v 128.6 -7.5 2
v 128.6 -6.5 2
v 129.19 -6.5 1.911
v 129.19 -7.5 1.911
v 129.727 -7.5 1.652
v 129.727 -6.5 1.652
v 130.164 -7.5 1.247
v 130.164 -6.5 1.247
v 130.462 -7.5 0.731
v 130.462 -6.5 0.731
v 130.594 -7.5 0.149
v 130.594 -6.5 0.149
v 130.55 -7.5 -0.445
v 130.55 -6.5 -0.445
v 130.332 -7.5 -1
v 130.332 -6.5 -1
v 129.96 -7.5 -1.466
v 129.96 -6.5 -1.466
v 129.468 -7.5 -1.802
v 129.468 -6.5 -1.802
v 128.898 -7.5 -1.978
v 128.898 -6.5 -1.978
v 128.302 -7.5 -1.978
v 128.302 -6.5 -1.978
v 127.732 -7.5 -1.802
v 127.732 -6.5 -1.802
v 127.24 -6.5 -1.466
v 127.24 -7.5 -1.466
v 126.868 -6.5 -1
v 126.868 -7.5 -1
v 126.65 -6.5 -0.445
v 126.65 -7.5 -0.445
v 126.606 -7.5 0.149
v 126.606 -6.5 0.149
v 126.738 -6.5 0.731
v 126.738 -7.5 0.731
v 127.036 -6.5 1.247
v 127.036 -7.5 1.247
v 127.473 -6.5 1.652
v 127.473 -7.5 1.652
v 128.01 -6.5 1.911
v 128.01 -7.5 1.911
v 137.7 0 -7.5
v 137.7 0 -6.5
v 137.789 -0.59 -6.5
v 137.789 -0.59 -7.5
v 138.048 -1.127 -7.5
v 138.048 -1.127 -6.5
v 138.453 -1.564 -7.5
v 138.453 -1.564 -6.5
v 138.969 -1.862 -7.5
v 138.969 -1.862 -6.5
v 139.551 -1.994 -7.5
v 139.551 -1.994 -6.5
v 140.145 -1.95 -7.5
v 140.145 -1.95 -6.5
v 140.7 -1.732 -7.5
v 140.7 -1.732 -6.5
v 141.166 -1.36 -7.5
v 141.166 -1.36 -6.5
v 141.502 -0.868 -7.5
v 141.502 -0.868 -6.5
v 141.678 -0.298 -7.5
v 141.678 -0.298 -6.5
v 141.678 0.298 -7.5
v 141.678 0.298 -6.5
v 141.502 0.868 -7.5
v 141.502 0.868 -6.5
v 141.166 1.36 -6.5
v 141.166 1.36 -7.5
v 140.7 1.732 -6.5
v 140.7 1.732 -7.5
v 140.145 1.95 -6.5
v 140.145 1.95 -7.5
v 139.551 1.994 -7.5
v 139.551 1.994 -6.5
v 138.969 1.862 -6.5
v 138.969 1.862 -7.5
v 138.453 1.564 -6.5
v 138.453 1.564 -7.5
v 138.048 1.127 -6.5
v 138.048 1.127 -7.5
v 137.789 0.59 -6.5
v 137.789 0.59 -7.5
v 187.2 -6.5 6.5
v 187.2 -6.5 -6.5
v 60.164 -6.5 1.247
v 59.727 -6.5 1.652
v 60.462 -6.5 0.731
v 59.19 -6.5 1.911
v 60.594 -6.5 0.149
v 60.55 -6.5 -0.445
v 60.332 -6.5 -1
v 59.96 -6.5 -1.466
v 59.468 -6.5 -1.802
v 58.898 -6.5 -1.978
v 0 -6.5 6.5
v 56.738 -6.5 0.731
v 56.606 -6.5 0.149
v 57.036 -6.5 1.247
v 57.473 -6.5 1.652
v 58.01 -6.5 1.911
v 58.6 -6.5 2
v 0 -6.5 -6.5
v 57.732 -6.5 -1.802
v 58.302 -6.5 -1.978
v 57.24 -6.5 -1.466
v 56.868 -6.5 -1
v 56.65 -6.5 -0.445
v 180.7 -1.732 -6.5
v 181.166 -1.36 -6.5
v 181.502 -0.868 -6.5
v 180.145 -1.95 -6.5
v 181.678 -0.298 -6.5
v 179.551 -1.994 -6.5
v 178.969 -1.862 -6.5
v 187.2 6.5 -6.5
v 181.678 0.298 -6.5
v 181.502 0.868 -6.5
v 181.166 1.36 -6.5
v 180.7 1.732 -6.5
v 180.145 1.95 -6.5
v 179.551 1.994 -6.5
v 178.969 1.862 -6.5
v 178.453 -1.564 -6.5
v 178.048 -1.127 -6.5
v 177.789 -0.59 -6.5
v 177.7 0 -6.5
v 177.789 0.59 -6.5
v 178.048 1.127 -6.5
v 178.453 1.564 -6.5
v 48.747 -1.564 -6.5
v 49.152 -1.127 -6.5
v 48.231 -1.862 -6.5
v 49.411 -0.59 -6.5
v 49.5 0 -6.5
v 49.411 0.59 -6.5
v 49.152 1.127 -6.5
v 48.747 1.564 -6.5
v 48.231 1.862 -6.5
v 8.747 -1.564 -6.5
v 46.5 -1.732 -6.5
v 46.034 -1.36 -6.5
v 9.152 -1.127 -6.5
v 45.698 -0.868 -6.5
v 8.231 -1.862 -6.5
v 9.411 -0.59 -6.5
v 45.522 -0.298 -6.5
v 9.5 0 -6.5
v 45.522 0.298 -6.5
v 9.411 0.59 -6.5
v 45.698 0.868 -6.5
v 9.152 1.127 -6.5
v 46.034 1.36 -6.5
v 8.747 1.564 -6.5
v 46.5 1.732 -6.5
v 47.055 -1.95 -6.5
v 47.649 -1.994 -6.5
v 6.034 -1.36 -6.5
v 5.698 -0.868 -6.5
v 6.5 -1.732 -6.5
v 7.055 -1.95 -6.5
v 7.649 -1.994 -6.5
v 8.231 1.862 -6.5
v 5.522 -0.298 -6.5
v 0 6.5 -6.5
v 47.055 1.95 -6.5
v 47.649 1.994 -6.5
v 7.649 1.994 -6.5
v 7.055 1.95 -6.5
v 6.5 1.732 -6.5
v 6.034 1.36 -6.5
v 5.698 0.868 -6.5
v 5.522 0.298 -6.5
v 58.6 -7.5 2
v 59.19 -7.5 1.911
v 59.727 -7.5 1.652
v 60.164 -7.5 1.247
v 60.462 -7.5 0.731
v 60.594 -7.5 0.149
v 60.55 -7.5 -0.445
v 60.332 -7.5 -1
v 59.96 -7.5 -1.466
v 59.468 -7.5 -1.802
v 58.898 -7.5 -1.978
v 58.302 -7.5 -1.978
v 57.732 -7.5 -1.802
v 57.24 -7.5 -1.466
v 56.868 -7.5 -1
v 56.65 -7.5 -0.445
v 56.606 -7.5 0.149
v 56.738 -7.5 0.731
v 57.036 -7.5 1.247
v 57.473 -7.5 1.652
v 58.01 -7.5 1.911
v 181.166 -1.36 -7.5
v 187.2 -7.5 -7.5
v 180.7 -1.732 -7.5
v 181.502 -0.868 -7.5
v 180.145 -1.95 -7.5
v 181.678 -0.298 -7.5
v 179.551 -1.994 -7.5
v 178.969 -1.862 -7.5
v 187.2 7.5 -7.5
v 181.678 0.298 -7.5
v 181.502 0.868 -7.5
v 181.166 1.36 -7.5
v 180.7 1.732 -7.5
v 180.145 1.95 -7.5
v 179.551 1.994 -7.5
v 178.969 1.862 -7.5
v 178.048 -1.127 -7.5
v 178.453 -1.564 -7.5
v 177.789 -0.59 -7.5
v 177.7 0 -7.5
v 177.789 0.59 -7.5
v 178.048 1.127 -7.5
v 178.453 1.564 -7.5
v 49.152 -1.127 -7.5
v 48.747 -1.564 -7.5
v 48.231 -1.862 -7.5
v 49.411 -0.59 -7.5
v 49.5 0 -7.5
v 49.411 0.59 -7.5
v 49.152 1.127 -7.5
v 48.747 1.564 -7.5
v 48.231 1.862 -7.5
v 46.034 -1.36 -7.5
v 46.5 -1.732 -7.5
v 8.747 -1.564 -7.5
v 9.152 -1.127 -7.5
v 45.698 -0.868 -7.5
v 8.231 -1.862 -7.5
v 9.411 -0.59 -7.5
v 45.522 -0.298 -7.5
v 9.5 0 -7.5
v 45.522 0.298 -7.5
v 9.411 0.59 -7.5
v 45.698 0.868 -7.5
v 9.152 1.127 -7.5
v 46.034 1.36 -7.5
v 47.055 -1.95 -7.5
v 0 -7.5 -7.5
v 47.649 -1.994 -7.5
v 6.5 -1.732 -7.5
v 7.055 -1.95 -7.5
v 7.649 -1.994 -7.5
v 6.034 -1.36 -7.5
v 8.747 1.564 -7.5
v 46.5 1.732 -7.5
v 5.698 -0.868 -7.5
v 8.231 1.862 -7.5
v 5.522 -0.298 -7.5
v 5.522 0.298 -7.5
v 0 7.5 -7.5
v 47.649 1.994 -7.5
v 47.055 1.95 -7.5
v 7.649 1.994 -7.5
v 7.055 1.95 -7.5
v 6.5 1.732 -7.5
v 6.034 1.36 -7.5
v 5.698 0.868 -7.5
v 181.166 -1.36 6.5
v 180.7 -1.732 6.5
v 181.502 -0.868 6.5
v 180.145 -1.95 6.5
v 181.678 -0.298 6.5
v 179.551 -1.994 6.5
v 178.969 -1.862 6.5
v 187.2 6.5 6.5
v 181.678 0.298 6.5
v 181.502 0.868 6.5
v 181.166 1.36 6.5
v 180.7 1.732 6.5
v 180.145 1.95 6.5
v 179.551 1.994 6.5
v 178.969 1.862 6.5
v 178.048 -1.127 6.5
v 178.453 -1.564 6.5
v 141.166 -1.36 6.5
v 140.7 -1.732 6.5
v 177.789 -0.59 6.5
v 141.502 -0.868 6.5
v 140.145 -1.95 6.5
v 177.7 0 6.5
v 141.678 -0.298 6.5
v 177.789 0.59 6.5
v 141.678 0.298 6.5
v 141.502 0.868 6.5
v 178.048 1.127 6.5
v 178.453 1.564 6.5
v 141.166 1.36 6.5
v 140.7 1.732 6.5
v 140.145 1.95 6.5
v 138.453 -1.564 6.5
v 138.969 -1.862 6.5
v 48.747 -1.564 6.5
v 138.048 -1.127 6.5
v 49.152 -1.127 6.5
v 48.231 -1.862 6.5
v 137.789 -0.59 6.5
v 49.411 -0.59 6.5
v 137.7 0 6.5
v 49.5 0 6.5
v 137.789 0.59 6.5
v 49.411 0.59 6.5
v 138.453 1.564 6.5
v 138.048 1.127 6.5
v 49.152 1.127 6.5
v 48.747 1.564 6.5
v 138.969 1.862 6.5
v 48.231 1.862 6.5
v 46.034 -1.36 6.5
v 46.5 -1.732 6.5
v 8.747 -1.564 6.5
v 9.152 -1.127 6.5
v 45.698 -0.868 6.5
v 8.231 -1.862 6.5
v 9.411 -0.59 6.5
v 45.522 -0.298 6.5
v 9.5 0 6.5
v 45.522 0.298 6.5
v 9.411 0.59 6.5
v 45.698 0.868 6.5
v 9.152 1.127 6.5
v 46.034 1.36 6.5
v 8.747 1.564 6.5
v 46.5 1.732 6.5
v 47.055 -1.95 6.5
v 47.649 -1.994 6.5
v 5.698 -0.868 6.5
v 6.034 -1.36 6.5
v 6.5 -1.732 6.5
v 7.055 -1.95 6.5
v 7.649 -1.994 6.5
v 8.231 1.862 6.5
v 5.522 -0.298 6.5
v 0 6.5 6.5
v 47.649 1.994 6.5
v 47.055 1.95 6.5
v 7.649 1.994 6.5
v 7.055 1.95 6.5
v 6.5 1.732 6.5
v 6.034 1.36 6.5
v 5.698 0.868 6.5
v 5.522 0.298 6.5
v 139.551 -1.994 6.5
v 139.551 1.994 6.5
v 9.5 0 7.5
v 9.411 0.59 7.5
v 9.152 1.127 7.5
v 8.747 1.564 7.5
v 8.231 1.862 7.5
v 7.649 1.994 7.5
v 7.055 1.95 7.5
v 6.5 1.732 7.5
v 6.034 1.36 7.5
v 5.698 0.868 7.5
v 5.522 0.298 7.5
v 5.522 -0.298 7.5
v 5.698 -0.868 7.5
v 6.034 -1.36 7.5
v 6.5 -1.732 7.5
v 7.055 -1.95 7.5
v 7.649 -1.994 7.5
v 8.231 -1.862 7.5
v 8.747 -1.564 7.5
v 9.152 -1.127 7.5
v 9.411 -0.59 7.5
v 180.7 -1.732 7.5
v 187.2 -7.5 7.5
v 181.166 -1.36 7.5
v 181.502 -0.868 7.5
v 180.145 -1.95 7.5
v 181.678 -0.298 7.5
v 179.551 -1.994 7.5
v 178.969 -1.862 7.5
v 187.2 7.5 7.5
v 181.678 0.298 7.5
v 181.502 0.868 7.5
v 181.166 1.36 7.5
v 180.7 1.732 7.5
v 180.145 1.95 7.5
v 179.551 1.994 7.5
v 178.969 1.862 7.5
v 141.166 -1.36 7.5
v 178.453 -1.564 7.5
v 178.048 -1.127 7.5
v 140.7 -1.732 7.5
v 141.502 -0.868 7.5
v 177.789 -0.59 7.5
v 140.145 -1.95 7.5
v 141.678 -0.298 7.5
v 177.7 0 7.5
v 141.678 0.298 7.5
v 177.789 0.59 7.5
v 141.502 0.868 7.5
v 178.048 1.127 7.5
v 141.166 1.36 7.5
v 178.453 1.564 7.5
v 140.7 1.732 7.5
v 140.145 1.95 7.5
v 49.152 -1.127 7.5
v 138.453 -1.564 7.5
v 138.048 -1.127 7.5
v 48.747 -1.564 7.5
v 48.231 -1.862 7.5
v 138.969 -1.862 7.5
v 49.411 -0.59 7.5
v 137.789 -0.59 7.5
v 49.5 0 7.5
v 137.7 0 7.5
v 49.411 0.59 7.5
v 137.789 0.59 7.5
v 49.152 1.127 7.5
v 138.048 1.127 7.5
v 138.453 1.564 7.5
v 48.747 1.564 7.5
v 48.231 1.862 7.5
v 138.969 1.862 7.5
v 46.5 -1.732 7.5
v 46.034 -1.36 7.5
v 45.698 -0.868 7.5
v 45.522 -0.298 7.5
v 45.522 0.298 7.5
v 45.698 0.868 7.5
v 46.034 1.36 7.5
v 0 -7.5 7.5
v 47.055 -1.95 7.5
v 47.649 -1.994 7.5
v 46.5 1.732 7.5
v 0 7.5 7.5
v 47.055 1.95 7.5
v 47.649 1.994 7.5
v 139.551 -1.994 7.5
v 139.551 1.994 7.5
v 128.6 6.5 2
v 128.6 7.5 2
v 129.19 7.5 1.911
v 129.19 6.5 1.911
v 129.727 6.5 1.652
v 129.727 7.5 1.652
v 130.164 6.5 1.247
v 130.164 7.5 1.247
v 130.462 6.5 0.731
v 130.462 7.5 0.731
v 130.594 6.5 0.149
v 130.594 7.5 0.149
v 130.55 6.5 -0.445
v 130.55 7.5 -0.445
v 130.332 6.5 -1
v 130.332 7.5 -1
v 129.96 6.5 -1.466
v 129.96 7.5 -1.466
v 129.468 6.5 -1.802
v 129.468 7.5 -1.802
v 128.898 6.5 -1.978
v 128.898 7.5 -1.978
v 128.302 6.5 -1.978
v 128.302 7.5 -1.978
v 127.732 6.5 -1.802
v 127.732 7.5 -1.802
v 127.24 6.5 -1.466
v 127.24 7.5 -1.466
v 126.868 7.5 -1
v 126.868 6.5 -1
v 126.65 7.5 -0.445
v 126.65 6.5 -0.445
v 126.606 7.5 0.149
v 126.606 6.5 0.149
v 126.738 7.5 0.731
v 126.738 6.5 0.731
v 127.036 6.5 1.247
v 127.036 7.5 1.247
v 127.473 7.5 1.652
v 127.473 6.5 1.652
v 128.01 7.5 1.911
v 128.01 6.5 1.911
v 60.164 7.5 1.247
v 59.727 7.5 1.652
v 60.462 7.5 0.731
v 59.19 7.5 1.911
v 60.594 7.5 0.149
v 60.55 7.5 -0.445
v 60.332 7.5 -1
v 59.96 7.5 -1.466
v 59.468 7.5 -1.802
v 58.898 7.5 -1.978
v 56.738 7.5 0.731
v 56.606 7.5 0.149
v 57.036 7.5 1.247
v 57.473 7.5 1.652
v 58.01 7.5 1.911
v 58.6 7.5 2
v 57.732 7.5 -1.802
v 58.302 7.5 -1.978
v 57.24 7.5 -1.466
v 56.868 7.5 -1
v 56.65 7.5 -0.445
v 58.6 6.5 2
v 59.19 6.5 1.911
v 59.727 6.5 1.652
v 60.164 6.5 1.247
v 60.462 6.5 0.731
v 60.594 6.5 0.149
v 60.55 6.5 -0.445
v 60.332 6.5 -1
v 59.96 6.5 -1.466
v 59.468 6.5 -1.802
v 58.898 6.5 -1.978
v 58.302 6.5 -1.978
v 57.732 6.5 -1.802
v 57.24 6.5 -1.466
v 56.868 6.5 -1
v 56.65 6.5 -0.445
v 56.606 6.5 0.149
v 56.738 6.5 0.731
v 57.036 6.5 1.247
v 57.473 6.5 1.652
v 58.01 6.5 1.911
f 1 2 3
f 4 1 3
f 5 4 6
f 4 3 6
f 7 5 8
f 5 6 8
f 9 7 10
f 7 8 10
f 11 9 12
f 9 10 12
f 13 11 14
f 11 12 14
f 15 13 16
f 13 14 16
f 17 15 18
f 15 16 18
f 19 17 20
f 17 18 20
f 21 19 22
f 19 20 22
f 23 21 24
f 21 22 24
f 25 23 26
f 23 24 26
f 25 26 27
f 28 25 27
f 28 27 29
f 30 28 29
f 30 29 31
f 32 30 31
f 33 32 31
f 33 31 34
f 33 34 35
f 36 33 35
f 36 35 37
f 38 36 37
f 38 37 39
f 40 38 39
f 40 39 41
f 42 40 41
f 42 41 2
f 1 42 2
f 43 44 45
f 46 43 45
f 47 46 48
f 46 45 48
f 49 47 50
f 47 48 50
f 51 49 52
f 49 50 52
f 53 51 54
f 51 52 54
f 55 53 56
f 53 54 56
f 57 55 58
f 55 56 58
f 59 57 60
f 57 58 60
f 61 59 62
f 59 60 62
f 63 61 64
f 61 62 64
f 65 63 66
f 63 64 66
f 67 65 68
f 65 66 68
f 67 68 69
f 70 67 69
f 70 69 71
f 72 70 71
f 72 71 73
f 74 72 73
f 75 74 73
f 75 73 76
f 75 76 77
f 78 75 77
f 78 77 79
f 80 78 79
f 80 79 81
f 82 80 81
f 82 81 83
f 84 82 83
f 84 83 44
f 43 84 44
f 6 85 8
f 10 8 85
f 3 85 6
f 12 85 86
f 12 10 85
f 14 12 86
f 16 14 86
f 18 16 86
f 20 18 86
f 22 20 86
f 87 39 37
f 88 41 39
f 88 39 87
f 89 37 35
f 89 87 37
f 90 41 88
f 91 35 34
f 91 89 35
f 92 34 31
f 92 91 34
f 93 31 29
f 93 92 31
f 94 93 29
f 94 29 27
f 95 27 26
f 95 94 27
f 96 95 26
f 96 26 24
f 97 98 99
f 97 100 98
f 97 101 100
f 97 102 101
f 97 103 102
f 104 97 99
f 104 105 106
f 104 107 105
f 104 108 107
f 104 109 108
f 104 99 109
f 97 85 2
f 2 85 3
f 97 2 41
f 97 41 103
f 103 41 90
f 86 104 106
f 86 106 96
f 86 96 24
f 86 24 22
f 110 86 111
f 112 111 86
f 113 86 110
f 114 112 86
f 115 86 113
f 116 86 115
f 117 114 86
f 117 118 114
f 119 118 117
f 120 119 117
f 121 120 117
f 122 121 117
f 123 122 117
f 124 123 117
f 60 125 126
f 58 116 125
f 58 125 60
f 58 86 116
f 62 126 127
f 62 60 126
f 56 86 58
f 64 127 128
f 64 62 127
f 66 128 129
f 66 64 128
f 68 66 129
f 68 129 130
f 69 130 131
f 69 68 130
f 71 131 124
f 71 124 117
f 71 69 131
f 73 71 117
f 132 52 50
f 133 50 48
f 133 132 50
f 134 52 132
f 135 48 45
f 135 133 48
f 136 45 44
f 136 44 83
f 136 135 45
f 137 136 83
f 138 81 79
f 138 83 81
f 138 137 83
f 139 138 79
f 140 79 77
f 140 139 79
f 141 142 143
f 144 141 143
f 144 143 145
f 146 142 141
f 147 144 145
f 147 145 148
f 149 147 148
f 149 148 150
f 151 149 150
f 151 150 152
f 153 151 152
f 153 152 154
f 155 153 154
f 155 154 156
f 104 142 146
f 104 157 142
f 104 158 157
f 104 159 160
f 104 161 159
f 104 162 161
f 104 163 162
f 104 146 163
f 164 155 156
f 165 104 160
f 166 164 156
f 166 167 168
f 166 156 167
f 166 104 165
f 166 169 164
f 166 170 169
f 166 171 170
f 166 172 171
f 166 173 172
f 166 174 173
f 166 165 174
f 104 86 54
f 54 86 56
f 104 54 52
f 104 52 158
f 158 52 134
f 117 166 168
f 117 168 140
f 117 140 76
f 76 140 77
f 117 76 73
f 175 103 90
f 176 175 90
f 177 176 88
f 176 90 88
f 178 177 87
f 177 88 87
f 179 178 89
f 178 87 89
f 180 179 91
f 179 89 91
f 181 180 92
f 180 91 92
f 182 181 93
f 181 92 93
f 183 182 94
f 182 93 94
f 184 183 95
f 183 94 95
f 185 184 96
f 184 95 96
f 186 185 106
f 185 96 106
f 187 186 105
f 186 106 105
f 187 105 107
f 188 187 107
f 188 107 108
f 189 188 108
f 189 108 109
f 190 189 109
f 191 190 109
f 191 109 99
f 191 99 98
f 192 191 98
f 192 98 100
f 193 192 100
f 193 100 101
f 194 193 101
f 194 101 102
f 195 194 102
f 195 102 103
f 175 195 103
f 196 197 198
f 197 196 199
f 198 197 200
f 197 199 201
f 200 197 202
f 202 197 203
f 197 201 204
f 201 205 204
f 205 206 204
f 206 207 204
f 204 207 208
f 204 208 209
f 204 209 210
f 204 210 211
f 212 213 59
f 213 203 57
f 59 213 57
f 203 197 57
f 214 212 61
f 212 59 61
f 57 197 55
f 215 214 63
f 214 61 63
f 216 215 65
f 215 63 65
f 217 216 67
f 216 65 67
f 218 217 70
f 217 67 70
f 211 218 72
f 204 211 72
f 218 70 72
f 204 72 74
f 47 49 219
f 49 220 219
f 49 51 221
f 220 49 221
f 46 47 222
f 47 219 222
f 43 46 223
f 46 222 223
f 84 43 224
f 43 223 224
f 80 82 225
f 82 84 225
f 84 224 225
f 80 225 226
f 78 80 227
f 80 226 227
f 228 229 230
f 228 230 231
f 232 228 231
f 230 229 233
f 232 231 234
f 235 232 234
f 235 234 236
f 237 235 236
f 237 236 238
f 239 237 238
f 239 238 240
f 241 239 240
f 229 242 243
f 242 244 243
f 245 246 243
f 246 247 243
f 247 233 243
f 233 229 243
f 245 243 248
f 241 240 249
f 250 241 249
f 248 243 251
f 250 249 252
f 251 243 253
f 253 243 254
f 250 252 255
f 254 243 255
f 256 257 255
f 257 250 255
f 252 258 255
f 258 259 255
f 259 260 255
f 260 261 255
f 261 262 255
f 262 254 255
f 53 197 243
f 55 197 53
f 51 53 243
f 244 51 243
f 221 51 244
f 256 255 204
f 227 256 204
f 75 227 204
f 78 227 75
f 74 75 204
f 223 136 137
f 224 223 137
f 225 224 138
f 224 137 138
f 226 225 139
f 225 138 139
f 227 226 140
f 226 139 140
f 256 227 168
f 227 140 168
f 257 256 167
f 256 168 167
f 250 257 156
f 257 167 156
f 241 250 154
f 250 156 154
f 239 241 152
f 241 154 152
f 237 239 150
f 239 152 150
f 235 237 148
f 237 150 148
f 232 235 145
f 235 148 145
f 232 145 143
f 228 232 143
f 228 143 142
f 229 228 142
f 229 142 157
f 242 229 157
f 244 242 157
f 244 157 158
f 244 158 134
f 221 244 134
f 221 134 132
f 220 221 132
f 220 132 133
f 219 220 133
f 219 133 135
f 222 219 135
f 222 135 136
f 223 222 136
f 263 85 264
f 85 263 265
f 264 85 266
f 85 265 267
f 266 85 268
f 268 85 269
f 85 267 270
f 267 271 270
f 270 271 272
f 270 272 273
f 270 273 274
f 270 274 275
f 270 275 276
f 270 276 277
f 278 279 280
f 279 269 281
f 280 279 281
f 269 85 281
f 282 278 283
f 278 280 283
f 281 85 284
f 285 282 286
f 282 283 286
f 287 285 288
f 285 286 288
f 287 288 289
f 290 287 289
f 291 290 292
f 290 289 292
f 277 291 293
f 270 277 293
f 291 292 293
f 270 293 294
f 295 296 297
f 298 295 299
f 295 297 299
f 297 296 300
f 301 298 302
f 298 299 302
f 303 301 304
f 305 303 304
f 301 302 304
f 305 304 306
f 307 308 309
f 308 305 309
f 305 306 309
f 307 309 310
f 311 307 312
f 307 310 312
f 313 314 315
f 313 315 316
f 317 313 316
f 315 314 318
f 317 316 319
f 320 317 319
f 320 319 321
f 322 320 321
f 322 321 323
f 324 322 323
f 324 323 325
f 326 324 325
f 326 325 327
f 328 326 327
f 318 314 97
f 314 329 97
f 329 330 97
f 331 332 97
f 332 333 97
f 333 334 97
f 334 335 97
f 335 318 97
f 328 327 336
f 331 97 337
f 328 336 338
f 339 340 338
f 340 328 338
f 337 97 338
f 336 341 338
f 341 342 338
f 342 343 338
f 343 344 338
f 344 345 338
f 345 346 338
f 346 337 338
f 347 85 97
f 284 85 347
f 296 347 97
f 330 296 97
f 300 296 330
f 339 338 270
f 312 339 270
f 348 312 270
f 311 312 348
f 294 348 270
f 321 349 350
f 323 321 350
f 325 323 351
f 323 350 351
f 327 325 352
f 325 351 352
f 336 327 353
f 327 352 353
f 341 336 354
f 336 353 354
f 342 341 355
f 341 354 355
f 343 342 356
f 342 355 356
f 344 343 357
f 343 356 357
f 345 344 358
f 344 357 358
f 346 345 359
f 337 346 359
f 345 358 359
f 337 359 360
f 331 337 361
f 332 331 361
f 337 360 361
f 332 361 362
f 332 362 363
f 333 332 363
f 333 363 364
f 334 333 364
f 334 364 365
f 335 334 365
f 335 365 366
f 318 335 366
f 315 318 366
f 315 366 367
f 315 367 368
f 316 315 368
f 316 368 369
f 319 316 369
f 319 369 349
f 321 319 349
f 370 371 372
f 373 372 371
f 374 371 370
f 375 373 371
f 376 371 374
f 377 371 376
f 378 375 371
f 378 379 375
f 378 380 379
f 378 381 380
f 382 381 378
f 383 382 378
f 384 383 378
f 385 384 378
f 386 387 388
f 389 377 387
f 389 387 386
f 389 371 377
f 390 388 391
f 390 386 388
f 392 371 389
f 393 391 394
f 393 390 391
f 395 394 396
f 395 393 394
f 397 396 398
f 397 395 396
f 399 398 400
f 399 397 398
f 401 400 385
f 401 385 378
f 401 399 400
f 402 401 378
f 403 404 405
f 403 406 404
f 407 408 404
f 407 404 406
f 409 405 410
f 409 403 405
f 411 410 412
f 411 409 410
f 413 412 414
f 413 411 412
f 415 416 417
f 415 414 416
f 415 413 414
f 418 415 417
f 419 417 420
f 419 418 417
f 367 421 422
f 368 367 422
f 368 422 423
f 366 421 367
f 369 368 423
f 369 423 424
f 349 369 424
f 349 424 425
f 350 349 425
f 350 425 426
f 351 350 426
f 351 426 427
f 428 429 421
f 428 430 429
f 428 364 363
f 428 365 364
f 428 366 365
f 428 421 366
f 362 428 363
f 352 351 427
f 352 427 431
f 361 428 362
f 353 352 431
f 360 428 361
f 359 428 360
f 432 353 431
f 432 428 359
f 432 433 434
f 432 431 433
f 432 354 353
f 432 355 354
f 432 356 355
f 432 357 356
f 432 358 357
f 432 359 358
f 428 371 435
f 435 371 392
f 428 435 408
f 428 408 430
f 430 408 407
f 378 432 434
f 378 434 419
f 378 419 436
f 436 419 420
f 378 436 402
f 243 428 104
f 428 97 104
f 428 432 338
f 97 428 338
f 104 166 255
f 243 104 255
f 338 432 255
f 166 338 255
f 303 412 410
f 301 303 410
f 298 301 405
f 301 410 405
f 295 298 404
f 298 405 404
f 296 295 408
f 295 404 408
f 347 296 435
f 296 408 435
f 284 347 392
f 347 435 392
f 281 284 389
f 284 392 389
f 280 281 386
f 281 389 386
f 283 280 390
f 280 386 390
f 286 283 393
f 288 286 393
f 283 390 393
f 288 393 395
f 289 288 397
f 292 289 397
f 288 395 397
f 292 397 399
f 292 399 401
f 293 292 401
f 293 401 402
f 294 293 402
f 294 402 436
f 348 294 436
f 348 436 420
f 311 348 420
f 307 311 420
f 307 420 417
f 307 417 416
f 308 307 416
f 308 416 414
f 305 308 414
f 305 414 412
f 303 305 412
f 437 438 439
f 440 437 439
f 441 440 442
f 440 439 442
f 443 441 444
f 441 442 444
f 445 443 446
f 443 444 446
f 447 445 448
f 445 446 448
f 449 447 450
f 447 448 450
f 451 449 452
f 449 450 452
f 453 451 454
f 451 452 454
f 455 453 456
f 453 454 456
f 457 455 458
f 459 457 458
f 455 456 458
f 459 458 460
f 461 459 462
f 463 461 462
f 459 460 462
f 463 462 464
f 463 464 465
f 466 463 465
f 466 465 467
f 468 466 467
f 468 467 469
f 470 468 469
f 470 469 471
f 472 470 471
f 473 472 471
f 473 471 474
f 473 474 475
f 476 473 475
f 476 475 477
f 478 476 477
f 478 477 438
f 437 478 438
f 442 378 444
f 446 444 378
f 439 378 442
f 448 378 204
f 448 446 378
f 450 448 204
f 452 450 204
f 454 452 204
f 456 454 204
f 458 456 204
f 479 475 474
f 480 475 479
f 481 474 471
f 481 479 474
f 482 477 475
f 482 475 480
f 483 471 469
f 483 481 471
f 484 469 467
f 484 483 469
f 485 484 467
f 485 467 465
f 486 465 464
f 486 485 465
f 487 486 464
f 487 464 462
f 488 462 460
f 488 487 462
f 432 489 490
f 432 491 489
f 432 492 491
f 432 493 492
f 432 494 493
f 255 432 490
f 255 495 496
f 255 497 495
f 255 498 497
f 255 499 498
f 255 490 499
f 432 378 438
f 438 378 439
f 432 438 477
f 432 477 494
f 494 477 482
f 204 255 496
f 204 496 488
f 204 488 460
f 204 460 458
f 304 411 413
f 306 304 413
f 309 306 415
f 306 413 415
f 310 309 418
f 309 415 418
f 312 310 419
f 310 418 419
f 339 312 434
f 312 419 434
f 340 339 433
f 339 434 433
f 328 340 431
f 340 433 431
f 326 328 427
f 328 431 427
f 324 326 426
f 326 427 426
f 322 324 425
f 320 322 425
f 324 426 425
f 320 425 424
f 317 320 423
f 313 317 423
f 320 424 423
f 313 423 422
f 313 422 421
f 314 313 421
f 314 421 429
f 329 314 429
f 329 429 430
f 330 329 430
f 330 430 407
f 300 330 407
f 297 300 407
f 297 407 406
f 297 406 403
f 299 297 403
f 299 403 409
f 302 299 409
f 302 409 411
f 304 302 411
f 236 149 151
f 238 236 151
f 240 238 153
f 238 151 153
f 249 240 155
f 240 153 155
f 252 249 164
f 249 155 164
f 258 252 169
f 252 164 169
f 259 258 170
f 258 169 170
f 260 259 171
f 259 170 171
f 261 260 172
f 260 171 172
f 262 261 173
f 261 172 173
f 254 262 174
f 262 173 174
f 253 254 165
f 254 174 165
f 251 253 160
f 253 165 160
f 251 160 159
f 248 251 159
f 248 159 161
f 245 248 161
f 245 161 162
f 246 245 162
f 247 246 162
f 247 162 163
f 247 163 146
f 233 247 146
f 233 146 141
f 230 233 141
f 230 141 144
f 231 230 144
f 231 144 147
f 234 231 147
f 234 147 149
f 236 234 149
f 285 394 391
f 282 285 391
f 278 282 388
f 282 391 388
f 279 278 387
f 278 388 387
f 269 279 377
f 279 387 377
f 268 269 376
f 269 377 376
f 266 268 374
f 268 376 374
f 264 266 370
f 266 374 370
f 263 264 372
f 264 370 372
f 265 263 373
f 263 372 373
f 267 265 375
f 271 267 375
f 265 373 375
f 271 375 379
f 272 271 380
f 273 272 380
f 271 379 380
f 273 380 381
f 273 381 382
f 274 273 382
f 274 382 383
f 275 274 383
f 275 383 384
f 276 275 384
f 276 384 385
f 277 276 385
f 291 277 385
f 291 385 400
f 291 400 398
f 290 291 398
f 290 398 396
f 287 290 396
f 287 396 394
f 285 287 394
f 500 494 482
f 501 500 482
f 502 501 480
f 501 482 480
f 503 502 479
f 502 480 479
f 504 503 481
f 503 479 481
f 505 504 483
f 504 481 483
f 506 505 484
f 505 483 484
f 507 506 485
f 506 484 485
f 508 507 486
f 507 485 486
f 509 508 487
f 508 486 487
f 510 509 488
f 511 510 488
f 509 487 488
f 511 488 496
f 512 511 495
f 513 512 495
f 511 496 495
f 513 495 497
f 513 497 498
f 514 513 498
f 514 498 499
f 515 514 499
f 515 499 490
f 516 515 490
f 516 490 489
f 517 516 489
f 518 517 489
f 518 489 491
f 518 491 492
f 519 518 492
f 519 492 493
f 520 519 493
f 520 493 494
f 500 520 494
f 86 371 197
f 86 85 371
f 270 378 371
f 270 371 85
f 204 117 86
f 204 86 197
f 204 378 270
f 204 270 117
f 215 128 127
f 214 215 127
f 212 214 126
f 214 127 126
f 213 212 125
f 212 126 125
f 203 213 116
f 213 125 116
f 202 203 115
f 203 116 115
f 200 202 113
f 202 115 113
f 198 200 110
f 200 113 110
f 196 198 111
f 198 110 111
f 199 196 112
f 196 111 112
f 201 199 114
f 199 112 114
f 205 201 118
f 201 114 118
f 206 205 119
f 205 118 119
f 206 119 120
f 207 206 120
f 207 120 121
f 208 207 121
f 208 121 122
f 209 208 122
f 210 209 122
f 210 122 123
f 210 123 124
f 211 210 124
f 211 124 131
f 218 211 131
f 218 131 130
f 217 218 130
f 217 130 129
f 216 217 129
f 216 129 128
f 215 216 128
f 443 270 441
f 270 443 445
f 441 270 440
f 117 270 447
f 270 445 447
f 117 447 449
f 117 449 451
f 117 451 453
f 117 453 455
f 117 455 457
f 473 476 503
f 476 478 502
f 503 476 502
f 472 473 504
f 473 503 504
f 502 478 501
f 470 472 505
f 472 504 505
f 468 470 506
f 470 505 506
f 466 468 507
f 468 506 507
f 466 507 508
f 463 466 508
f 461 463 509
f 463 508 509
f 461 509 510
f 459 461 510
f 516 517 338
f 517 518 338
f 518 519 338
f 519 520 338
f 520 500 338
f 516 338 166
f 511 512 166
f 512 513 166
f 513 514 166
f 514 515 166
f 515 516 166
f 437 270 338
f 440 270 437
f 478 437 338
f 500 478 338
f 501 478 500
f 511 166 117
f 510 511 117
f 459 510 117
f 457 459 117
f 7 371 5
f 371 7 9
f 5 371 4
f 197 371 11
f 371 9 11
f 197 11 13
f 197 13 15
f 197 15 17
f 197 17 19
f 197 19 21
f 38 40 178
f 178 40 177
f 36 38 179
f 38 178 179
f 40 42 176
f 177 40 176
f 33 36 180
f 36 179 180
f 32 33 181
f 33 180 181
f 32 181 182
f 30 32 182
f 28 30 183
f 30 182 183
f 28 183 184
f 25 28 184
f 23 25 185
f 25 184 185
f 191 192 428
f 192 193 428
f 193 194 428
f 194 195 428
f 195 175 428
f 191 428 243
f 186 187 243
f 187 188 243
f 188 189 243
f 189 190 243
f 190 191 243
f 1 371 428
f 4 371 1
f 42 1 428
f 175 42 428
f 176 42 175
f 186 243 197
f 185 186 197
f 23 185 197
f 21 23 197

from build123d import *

# Parameters (mm, degrees)
SKETCH_1_W          = 15
SKETCH_1_H          = 15
SKETCH_1_W_2        = 13
SKETCH_1_H_2        = 13
EXTRUDE_1_DEPTH     = 187.2
SKETCH_2_R          = 2
CUT_EXTRUDE_1_DEPTH = 188.949700718
SKETCH_3_R          = 2
CUT_EXTRUDE_2_DEPTH = 188.949700718


with BuildPart() as part:
    # ｽｹｯﾁ1 → 押し出し-薄板1 (new body)
    with BuildSketch(Plane(origin=(0, 0, 0), x_dir=(0, 0, -1), z_dir=(1, 0, 0))):
        Rectangle(SKETCH_1_W, SKETCH_1_H)
        Rectangle(SKETCH_1_W_2, SKETCH_1_H_2, mode=Mode.SUBTRACT)
    extrude(amount=EXTRUDE_1_DEPTH)

    # ｽｹｯﾁ2 → ｶｯﾄ - 押し出し1 (cut, through all)
    with BuildSketch(Plane.XY.offset(7.5)):
        with Locations((7.5, 0)):
            Circle(SKETCH_2_R)
        with Locations((47.5, 0)):
            Circle(SKETCH_2_R)
        with Locations(Location((139.7, 0, 0), (0, 0, 180))):
            Circle(SKETCH_2_R)
        with Locations(Location((179.7, 0, 0), (0, 0, 180))):
            Circle(SKETCH_2_R)
    extrude(amount=-CUT_EXTRUDE_1_DEPTH, mode=Mode.SUBTRACT)

    # ｽｹｯﾁ3 → ｶｯﾄ - 押し出し2 (cut, through all)
    with BuildSketch(Plane(origin=(0, 7.5, 0), x_dir=(1, 0, 0), z_dir=(0, 1, 0))):
        with Locations(Location((58.6, 0, 0), (0, 0, 270))):
            Circle(SKETCH_3_R)
        with Locations(Location((128.6, 0, 0), (0, 0, 270))):
            Circle(SKETCH_3_R)
    extrude(amount=-CUT_EXTRUDE_2_DEPTH, mode=Mode.SUBTRACT)


solid = part.part
